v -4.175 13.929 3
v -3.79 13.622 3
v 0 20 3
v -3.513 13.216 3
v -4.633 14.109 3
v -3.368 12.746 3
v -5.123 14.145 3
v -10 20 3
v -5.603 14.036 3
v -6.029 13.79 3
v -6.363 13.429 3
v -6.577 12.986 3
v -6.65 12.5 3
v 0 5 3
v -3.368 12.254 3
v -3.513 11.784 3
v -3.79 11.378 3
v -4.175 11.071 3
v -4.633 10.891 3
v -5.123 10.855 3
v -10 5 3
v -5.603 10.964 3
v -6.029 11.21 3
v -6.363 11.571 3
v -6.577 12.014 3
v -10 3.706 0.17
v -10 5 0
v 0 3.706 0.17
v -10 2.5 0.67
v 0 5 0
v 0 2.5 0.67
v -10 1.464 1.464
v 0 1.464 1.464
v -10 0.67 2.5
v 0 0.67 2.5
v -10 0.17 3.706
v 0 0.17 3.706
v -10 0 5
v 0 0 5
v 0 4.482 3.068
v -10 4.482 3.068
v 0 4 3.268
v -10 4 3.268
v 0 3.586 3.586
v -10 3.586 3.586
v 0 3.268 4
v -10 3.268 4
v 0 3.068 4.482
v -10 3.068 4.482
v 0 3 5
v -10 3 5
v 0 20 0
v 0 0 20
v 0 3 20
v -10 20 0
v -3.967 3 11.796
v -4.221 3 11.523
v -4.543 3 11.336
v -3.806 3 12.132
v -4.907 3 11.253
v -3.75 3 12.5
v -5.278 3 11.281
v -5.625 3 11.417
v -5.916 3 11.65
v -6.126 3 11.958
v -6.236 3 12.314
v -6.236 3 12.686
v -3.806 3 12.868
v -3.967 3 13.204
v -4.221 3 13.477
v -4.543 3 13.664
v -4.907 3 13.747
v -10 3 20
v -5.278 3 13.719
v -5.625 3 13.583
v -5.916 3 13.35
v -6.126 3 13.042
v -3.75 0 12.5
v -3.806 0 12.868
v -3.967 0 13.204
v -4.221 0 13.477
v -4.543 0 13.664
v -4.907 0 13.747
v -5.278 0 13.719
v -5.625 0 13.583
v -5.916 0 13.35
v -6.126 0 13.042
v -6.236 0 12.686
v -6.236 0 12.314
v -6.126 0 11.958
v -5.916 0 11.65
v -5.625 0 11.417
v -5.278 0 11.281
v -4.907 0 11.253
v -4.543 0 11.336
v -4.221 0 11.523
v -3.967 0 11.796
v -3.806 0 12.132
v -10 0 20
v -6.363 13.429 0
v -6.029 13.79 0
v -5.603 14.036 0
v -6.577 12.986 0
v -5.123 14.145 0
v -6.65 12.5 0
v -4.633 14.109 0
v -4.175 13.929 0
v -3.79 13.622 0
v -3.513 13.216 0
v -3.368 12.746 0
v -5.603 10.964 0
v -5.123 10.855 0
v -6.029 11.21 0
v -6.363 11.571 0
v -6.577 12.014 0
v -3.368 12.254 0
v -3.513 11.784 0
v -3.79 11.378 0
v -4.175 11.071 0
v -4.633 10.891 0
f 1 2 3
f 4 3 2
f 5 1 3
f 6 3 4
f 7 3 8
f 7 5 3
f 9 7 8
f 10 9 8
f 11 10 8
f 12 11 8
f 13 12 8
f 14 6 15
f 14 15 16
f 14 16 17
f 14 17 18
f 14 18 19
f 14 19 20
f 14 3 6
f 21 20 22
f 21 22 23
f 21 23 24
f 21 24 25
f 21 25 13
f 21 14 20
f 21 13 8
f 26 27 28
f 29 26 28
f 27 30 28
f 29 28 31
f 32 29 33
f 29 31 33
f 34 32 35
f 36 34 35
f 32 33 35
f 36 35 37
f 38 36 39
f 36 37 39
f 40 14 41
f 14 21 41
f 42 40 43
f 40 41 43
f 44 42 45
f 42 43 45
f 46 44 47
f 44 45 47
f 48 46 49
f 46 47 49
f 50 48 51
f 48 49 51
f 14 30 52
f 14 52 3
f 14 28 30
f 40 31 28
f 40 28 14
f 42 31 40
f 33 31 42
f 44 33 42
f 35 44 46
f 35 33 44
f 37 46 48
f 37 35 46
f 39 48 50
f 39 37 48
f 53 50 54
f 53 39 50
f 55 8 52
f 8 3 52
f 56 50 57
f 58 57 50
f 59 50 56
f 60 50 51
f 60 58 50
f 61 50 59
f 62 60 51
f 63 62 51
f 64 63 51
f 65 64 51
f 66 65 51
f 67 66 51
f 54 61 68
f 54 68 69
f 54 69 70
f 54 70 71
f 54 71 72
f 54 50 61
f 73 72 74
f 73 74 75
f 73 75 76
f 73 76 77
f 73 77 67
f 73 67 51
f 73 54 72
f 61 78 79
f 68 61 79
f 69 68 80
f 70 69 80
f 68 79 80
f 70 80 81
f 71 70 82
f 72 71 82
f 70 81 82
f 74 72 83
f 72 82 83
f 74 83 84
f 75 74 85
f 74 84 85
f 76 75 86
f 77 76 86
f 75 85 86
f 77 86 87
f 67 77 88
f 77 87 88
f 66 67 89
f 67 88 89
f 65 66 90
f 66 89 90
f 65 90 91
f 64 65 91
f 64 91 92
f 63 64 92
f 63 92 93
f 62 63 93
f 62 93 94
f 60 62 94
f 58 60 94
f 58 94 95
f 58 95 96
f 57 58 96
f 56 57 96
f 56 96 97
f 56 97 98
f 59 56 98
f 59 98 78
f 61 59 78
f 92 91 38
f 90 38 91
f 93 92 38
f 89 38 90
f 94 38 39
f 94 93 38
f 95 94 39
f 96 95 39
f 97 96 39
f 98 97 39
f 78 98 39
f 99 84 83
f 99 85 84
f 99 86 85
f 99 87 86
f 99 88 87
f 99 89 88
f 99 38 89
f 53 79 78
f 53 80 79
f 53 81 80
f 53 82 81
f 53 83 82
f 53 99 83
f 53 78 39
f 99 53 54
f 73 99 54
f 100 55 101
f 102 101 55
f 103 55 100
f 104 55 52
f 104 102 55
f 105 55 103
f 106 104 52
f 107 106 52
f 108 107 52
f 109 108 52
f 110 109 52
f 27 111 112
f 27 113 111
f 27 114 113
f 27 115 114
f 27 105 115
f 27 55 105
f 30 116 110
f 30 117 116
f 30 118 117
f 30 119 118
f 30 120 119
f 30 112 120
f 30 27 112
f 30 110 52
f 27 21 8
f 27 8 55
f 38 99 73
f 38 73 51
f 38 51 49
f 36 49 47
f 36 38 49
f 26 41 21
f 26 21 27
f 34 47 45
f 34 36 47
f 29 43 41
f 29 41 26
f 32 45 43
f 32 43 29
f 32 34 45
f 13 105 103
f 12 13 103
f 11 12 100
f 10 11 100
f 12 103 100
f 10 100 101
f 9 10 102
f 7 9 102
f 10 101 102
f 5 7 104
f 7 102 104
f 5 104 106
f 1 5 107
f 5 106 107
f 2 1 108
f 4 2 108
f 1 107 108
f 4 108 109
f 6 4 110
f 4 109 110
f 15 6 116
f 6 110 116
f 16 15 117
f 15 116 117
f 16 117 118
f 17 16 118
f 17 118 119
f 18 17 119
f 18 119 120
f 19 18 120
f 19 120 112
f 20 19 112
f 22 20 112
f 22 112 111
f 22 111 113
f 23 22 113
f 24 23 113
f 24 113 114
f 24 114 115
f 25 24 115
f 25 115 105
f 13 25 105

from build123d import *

# Parameters (mm, degrees)
F2_W = 10
F2_H = 3
F5_D = 3.3
F7_D = 2.5


with BuildPart() as f3:
    # F3: sweep along a path in F0
    with BuildLine(Plane.YZ) as f3_path:
        Line((20, 0), (5, 0))
        ThreePointArc((5, 0), (1.4644660941, 1.4644660941), (0, 5))
        Line((0, 5), (0, 20))
    # F2 (on line) → F3 (sweep)
    with BuildSketch(Plane.XZ.offset(-20)):
        with Locations((-5, 1.5)):
            Rectangle(F2_W, F2_H)
    sweep(path=f3_path.line)

    # F5 (through all)
    with Locations(Plane.XY.offset(3)):
        with Locations((-5, 12.5)):
            Hole(F5_D / 2)

    # F7 (through all)
    with Locations(Plane(origin=(0, 3, 0), x_dir=(-1, 0, 0), z_dir=(0, 1, 0))):
        with Locations((5, 12.5)):
            Hole(F7_D / 2)


solid = f3.part
